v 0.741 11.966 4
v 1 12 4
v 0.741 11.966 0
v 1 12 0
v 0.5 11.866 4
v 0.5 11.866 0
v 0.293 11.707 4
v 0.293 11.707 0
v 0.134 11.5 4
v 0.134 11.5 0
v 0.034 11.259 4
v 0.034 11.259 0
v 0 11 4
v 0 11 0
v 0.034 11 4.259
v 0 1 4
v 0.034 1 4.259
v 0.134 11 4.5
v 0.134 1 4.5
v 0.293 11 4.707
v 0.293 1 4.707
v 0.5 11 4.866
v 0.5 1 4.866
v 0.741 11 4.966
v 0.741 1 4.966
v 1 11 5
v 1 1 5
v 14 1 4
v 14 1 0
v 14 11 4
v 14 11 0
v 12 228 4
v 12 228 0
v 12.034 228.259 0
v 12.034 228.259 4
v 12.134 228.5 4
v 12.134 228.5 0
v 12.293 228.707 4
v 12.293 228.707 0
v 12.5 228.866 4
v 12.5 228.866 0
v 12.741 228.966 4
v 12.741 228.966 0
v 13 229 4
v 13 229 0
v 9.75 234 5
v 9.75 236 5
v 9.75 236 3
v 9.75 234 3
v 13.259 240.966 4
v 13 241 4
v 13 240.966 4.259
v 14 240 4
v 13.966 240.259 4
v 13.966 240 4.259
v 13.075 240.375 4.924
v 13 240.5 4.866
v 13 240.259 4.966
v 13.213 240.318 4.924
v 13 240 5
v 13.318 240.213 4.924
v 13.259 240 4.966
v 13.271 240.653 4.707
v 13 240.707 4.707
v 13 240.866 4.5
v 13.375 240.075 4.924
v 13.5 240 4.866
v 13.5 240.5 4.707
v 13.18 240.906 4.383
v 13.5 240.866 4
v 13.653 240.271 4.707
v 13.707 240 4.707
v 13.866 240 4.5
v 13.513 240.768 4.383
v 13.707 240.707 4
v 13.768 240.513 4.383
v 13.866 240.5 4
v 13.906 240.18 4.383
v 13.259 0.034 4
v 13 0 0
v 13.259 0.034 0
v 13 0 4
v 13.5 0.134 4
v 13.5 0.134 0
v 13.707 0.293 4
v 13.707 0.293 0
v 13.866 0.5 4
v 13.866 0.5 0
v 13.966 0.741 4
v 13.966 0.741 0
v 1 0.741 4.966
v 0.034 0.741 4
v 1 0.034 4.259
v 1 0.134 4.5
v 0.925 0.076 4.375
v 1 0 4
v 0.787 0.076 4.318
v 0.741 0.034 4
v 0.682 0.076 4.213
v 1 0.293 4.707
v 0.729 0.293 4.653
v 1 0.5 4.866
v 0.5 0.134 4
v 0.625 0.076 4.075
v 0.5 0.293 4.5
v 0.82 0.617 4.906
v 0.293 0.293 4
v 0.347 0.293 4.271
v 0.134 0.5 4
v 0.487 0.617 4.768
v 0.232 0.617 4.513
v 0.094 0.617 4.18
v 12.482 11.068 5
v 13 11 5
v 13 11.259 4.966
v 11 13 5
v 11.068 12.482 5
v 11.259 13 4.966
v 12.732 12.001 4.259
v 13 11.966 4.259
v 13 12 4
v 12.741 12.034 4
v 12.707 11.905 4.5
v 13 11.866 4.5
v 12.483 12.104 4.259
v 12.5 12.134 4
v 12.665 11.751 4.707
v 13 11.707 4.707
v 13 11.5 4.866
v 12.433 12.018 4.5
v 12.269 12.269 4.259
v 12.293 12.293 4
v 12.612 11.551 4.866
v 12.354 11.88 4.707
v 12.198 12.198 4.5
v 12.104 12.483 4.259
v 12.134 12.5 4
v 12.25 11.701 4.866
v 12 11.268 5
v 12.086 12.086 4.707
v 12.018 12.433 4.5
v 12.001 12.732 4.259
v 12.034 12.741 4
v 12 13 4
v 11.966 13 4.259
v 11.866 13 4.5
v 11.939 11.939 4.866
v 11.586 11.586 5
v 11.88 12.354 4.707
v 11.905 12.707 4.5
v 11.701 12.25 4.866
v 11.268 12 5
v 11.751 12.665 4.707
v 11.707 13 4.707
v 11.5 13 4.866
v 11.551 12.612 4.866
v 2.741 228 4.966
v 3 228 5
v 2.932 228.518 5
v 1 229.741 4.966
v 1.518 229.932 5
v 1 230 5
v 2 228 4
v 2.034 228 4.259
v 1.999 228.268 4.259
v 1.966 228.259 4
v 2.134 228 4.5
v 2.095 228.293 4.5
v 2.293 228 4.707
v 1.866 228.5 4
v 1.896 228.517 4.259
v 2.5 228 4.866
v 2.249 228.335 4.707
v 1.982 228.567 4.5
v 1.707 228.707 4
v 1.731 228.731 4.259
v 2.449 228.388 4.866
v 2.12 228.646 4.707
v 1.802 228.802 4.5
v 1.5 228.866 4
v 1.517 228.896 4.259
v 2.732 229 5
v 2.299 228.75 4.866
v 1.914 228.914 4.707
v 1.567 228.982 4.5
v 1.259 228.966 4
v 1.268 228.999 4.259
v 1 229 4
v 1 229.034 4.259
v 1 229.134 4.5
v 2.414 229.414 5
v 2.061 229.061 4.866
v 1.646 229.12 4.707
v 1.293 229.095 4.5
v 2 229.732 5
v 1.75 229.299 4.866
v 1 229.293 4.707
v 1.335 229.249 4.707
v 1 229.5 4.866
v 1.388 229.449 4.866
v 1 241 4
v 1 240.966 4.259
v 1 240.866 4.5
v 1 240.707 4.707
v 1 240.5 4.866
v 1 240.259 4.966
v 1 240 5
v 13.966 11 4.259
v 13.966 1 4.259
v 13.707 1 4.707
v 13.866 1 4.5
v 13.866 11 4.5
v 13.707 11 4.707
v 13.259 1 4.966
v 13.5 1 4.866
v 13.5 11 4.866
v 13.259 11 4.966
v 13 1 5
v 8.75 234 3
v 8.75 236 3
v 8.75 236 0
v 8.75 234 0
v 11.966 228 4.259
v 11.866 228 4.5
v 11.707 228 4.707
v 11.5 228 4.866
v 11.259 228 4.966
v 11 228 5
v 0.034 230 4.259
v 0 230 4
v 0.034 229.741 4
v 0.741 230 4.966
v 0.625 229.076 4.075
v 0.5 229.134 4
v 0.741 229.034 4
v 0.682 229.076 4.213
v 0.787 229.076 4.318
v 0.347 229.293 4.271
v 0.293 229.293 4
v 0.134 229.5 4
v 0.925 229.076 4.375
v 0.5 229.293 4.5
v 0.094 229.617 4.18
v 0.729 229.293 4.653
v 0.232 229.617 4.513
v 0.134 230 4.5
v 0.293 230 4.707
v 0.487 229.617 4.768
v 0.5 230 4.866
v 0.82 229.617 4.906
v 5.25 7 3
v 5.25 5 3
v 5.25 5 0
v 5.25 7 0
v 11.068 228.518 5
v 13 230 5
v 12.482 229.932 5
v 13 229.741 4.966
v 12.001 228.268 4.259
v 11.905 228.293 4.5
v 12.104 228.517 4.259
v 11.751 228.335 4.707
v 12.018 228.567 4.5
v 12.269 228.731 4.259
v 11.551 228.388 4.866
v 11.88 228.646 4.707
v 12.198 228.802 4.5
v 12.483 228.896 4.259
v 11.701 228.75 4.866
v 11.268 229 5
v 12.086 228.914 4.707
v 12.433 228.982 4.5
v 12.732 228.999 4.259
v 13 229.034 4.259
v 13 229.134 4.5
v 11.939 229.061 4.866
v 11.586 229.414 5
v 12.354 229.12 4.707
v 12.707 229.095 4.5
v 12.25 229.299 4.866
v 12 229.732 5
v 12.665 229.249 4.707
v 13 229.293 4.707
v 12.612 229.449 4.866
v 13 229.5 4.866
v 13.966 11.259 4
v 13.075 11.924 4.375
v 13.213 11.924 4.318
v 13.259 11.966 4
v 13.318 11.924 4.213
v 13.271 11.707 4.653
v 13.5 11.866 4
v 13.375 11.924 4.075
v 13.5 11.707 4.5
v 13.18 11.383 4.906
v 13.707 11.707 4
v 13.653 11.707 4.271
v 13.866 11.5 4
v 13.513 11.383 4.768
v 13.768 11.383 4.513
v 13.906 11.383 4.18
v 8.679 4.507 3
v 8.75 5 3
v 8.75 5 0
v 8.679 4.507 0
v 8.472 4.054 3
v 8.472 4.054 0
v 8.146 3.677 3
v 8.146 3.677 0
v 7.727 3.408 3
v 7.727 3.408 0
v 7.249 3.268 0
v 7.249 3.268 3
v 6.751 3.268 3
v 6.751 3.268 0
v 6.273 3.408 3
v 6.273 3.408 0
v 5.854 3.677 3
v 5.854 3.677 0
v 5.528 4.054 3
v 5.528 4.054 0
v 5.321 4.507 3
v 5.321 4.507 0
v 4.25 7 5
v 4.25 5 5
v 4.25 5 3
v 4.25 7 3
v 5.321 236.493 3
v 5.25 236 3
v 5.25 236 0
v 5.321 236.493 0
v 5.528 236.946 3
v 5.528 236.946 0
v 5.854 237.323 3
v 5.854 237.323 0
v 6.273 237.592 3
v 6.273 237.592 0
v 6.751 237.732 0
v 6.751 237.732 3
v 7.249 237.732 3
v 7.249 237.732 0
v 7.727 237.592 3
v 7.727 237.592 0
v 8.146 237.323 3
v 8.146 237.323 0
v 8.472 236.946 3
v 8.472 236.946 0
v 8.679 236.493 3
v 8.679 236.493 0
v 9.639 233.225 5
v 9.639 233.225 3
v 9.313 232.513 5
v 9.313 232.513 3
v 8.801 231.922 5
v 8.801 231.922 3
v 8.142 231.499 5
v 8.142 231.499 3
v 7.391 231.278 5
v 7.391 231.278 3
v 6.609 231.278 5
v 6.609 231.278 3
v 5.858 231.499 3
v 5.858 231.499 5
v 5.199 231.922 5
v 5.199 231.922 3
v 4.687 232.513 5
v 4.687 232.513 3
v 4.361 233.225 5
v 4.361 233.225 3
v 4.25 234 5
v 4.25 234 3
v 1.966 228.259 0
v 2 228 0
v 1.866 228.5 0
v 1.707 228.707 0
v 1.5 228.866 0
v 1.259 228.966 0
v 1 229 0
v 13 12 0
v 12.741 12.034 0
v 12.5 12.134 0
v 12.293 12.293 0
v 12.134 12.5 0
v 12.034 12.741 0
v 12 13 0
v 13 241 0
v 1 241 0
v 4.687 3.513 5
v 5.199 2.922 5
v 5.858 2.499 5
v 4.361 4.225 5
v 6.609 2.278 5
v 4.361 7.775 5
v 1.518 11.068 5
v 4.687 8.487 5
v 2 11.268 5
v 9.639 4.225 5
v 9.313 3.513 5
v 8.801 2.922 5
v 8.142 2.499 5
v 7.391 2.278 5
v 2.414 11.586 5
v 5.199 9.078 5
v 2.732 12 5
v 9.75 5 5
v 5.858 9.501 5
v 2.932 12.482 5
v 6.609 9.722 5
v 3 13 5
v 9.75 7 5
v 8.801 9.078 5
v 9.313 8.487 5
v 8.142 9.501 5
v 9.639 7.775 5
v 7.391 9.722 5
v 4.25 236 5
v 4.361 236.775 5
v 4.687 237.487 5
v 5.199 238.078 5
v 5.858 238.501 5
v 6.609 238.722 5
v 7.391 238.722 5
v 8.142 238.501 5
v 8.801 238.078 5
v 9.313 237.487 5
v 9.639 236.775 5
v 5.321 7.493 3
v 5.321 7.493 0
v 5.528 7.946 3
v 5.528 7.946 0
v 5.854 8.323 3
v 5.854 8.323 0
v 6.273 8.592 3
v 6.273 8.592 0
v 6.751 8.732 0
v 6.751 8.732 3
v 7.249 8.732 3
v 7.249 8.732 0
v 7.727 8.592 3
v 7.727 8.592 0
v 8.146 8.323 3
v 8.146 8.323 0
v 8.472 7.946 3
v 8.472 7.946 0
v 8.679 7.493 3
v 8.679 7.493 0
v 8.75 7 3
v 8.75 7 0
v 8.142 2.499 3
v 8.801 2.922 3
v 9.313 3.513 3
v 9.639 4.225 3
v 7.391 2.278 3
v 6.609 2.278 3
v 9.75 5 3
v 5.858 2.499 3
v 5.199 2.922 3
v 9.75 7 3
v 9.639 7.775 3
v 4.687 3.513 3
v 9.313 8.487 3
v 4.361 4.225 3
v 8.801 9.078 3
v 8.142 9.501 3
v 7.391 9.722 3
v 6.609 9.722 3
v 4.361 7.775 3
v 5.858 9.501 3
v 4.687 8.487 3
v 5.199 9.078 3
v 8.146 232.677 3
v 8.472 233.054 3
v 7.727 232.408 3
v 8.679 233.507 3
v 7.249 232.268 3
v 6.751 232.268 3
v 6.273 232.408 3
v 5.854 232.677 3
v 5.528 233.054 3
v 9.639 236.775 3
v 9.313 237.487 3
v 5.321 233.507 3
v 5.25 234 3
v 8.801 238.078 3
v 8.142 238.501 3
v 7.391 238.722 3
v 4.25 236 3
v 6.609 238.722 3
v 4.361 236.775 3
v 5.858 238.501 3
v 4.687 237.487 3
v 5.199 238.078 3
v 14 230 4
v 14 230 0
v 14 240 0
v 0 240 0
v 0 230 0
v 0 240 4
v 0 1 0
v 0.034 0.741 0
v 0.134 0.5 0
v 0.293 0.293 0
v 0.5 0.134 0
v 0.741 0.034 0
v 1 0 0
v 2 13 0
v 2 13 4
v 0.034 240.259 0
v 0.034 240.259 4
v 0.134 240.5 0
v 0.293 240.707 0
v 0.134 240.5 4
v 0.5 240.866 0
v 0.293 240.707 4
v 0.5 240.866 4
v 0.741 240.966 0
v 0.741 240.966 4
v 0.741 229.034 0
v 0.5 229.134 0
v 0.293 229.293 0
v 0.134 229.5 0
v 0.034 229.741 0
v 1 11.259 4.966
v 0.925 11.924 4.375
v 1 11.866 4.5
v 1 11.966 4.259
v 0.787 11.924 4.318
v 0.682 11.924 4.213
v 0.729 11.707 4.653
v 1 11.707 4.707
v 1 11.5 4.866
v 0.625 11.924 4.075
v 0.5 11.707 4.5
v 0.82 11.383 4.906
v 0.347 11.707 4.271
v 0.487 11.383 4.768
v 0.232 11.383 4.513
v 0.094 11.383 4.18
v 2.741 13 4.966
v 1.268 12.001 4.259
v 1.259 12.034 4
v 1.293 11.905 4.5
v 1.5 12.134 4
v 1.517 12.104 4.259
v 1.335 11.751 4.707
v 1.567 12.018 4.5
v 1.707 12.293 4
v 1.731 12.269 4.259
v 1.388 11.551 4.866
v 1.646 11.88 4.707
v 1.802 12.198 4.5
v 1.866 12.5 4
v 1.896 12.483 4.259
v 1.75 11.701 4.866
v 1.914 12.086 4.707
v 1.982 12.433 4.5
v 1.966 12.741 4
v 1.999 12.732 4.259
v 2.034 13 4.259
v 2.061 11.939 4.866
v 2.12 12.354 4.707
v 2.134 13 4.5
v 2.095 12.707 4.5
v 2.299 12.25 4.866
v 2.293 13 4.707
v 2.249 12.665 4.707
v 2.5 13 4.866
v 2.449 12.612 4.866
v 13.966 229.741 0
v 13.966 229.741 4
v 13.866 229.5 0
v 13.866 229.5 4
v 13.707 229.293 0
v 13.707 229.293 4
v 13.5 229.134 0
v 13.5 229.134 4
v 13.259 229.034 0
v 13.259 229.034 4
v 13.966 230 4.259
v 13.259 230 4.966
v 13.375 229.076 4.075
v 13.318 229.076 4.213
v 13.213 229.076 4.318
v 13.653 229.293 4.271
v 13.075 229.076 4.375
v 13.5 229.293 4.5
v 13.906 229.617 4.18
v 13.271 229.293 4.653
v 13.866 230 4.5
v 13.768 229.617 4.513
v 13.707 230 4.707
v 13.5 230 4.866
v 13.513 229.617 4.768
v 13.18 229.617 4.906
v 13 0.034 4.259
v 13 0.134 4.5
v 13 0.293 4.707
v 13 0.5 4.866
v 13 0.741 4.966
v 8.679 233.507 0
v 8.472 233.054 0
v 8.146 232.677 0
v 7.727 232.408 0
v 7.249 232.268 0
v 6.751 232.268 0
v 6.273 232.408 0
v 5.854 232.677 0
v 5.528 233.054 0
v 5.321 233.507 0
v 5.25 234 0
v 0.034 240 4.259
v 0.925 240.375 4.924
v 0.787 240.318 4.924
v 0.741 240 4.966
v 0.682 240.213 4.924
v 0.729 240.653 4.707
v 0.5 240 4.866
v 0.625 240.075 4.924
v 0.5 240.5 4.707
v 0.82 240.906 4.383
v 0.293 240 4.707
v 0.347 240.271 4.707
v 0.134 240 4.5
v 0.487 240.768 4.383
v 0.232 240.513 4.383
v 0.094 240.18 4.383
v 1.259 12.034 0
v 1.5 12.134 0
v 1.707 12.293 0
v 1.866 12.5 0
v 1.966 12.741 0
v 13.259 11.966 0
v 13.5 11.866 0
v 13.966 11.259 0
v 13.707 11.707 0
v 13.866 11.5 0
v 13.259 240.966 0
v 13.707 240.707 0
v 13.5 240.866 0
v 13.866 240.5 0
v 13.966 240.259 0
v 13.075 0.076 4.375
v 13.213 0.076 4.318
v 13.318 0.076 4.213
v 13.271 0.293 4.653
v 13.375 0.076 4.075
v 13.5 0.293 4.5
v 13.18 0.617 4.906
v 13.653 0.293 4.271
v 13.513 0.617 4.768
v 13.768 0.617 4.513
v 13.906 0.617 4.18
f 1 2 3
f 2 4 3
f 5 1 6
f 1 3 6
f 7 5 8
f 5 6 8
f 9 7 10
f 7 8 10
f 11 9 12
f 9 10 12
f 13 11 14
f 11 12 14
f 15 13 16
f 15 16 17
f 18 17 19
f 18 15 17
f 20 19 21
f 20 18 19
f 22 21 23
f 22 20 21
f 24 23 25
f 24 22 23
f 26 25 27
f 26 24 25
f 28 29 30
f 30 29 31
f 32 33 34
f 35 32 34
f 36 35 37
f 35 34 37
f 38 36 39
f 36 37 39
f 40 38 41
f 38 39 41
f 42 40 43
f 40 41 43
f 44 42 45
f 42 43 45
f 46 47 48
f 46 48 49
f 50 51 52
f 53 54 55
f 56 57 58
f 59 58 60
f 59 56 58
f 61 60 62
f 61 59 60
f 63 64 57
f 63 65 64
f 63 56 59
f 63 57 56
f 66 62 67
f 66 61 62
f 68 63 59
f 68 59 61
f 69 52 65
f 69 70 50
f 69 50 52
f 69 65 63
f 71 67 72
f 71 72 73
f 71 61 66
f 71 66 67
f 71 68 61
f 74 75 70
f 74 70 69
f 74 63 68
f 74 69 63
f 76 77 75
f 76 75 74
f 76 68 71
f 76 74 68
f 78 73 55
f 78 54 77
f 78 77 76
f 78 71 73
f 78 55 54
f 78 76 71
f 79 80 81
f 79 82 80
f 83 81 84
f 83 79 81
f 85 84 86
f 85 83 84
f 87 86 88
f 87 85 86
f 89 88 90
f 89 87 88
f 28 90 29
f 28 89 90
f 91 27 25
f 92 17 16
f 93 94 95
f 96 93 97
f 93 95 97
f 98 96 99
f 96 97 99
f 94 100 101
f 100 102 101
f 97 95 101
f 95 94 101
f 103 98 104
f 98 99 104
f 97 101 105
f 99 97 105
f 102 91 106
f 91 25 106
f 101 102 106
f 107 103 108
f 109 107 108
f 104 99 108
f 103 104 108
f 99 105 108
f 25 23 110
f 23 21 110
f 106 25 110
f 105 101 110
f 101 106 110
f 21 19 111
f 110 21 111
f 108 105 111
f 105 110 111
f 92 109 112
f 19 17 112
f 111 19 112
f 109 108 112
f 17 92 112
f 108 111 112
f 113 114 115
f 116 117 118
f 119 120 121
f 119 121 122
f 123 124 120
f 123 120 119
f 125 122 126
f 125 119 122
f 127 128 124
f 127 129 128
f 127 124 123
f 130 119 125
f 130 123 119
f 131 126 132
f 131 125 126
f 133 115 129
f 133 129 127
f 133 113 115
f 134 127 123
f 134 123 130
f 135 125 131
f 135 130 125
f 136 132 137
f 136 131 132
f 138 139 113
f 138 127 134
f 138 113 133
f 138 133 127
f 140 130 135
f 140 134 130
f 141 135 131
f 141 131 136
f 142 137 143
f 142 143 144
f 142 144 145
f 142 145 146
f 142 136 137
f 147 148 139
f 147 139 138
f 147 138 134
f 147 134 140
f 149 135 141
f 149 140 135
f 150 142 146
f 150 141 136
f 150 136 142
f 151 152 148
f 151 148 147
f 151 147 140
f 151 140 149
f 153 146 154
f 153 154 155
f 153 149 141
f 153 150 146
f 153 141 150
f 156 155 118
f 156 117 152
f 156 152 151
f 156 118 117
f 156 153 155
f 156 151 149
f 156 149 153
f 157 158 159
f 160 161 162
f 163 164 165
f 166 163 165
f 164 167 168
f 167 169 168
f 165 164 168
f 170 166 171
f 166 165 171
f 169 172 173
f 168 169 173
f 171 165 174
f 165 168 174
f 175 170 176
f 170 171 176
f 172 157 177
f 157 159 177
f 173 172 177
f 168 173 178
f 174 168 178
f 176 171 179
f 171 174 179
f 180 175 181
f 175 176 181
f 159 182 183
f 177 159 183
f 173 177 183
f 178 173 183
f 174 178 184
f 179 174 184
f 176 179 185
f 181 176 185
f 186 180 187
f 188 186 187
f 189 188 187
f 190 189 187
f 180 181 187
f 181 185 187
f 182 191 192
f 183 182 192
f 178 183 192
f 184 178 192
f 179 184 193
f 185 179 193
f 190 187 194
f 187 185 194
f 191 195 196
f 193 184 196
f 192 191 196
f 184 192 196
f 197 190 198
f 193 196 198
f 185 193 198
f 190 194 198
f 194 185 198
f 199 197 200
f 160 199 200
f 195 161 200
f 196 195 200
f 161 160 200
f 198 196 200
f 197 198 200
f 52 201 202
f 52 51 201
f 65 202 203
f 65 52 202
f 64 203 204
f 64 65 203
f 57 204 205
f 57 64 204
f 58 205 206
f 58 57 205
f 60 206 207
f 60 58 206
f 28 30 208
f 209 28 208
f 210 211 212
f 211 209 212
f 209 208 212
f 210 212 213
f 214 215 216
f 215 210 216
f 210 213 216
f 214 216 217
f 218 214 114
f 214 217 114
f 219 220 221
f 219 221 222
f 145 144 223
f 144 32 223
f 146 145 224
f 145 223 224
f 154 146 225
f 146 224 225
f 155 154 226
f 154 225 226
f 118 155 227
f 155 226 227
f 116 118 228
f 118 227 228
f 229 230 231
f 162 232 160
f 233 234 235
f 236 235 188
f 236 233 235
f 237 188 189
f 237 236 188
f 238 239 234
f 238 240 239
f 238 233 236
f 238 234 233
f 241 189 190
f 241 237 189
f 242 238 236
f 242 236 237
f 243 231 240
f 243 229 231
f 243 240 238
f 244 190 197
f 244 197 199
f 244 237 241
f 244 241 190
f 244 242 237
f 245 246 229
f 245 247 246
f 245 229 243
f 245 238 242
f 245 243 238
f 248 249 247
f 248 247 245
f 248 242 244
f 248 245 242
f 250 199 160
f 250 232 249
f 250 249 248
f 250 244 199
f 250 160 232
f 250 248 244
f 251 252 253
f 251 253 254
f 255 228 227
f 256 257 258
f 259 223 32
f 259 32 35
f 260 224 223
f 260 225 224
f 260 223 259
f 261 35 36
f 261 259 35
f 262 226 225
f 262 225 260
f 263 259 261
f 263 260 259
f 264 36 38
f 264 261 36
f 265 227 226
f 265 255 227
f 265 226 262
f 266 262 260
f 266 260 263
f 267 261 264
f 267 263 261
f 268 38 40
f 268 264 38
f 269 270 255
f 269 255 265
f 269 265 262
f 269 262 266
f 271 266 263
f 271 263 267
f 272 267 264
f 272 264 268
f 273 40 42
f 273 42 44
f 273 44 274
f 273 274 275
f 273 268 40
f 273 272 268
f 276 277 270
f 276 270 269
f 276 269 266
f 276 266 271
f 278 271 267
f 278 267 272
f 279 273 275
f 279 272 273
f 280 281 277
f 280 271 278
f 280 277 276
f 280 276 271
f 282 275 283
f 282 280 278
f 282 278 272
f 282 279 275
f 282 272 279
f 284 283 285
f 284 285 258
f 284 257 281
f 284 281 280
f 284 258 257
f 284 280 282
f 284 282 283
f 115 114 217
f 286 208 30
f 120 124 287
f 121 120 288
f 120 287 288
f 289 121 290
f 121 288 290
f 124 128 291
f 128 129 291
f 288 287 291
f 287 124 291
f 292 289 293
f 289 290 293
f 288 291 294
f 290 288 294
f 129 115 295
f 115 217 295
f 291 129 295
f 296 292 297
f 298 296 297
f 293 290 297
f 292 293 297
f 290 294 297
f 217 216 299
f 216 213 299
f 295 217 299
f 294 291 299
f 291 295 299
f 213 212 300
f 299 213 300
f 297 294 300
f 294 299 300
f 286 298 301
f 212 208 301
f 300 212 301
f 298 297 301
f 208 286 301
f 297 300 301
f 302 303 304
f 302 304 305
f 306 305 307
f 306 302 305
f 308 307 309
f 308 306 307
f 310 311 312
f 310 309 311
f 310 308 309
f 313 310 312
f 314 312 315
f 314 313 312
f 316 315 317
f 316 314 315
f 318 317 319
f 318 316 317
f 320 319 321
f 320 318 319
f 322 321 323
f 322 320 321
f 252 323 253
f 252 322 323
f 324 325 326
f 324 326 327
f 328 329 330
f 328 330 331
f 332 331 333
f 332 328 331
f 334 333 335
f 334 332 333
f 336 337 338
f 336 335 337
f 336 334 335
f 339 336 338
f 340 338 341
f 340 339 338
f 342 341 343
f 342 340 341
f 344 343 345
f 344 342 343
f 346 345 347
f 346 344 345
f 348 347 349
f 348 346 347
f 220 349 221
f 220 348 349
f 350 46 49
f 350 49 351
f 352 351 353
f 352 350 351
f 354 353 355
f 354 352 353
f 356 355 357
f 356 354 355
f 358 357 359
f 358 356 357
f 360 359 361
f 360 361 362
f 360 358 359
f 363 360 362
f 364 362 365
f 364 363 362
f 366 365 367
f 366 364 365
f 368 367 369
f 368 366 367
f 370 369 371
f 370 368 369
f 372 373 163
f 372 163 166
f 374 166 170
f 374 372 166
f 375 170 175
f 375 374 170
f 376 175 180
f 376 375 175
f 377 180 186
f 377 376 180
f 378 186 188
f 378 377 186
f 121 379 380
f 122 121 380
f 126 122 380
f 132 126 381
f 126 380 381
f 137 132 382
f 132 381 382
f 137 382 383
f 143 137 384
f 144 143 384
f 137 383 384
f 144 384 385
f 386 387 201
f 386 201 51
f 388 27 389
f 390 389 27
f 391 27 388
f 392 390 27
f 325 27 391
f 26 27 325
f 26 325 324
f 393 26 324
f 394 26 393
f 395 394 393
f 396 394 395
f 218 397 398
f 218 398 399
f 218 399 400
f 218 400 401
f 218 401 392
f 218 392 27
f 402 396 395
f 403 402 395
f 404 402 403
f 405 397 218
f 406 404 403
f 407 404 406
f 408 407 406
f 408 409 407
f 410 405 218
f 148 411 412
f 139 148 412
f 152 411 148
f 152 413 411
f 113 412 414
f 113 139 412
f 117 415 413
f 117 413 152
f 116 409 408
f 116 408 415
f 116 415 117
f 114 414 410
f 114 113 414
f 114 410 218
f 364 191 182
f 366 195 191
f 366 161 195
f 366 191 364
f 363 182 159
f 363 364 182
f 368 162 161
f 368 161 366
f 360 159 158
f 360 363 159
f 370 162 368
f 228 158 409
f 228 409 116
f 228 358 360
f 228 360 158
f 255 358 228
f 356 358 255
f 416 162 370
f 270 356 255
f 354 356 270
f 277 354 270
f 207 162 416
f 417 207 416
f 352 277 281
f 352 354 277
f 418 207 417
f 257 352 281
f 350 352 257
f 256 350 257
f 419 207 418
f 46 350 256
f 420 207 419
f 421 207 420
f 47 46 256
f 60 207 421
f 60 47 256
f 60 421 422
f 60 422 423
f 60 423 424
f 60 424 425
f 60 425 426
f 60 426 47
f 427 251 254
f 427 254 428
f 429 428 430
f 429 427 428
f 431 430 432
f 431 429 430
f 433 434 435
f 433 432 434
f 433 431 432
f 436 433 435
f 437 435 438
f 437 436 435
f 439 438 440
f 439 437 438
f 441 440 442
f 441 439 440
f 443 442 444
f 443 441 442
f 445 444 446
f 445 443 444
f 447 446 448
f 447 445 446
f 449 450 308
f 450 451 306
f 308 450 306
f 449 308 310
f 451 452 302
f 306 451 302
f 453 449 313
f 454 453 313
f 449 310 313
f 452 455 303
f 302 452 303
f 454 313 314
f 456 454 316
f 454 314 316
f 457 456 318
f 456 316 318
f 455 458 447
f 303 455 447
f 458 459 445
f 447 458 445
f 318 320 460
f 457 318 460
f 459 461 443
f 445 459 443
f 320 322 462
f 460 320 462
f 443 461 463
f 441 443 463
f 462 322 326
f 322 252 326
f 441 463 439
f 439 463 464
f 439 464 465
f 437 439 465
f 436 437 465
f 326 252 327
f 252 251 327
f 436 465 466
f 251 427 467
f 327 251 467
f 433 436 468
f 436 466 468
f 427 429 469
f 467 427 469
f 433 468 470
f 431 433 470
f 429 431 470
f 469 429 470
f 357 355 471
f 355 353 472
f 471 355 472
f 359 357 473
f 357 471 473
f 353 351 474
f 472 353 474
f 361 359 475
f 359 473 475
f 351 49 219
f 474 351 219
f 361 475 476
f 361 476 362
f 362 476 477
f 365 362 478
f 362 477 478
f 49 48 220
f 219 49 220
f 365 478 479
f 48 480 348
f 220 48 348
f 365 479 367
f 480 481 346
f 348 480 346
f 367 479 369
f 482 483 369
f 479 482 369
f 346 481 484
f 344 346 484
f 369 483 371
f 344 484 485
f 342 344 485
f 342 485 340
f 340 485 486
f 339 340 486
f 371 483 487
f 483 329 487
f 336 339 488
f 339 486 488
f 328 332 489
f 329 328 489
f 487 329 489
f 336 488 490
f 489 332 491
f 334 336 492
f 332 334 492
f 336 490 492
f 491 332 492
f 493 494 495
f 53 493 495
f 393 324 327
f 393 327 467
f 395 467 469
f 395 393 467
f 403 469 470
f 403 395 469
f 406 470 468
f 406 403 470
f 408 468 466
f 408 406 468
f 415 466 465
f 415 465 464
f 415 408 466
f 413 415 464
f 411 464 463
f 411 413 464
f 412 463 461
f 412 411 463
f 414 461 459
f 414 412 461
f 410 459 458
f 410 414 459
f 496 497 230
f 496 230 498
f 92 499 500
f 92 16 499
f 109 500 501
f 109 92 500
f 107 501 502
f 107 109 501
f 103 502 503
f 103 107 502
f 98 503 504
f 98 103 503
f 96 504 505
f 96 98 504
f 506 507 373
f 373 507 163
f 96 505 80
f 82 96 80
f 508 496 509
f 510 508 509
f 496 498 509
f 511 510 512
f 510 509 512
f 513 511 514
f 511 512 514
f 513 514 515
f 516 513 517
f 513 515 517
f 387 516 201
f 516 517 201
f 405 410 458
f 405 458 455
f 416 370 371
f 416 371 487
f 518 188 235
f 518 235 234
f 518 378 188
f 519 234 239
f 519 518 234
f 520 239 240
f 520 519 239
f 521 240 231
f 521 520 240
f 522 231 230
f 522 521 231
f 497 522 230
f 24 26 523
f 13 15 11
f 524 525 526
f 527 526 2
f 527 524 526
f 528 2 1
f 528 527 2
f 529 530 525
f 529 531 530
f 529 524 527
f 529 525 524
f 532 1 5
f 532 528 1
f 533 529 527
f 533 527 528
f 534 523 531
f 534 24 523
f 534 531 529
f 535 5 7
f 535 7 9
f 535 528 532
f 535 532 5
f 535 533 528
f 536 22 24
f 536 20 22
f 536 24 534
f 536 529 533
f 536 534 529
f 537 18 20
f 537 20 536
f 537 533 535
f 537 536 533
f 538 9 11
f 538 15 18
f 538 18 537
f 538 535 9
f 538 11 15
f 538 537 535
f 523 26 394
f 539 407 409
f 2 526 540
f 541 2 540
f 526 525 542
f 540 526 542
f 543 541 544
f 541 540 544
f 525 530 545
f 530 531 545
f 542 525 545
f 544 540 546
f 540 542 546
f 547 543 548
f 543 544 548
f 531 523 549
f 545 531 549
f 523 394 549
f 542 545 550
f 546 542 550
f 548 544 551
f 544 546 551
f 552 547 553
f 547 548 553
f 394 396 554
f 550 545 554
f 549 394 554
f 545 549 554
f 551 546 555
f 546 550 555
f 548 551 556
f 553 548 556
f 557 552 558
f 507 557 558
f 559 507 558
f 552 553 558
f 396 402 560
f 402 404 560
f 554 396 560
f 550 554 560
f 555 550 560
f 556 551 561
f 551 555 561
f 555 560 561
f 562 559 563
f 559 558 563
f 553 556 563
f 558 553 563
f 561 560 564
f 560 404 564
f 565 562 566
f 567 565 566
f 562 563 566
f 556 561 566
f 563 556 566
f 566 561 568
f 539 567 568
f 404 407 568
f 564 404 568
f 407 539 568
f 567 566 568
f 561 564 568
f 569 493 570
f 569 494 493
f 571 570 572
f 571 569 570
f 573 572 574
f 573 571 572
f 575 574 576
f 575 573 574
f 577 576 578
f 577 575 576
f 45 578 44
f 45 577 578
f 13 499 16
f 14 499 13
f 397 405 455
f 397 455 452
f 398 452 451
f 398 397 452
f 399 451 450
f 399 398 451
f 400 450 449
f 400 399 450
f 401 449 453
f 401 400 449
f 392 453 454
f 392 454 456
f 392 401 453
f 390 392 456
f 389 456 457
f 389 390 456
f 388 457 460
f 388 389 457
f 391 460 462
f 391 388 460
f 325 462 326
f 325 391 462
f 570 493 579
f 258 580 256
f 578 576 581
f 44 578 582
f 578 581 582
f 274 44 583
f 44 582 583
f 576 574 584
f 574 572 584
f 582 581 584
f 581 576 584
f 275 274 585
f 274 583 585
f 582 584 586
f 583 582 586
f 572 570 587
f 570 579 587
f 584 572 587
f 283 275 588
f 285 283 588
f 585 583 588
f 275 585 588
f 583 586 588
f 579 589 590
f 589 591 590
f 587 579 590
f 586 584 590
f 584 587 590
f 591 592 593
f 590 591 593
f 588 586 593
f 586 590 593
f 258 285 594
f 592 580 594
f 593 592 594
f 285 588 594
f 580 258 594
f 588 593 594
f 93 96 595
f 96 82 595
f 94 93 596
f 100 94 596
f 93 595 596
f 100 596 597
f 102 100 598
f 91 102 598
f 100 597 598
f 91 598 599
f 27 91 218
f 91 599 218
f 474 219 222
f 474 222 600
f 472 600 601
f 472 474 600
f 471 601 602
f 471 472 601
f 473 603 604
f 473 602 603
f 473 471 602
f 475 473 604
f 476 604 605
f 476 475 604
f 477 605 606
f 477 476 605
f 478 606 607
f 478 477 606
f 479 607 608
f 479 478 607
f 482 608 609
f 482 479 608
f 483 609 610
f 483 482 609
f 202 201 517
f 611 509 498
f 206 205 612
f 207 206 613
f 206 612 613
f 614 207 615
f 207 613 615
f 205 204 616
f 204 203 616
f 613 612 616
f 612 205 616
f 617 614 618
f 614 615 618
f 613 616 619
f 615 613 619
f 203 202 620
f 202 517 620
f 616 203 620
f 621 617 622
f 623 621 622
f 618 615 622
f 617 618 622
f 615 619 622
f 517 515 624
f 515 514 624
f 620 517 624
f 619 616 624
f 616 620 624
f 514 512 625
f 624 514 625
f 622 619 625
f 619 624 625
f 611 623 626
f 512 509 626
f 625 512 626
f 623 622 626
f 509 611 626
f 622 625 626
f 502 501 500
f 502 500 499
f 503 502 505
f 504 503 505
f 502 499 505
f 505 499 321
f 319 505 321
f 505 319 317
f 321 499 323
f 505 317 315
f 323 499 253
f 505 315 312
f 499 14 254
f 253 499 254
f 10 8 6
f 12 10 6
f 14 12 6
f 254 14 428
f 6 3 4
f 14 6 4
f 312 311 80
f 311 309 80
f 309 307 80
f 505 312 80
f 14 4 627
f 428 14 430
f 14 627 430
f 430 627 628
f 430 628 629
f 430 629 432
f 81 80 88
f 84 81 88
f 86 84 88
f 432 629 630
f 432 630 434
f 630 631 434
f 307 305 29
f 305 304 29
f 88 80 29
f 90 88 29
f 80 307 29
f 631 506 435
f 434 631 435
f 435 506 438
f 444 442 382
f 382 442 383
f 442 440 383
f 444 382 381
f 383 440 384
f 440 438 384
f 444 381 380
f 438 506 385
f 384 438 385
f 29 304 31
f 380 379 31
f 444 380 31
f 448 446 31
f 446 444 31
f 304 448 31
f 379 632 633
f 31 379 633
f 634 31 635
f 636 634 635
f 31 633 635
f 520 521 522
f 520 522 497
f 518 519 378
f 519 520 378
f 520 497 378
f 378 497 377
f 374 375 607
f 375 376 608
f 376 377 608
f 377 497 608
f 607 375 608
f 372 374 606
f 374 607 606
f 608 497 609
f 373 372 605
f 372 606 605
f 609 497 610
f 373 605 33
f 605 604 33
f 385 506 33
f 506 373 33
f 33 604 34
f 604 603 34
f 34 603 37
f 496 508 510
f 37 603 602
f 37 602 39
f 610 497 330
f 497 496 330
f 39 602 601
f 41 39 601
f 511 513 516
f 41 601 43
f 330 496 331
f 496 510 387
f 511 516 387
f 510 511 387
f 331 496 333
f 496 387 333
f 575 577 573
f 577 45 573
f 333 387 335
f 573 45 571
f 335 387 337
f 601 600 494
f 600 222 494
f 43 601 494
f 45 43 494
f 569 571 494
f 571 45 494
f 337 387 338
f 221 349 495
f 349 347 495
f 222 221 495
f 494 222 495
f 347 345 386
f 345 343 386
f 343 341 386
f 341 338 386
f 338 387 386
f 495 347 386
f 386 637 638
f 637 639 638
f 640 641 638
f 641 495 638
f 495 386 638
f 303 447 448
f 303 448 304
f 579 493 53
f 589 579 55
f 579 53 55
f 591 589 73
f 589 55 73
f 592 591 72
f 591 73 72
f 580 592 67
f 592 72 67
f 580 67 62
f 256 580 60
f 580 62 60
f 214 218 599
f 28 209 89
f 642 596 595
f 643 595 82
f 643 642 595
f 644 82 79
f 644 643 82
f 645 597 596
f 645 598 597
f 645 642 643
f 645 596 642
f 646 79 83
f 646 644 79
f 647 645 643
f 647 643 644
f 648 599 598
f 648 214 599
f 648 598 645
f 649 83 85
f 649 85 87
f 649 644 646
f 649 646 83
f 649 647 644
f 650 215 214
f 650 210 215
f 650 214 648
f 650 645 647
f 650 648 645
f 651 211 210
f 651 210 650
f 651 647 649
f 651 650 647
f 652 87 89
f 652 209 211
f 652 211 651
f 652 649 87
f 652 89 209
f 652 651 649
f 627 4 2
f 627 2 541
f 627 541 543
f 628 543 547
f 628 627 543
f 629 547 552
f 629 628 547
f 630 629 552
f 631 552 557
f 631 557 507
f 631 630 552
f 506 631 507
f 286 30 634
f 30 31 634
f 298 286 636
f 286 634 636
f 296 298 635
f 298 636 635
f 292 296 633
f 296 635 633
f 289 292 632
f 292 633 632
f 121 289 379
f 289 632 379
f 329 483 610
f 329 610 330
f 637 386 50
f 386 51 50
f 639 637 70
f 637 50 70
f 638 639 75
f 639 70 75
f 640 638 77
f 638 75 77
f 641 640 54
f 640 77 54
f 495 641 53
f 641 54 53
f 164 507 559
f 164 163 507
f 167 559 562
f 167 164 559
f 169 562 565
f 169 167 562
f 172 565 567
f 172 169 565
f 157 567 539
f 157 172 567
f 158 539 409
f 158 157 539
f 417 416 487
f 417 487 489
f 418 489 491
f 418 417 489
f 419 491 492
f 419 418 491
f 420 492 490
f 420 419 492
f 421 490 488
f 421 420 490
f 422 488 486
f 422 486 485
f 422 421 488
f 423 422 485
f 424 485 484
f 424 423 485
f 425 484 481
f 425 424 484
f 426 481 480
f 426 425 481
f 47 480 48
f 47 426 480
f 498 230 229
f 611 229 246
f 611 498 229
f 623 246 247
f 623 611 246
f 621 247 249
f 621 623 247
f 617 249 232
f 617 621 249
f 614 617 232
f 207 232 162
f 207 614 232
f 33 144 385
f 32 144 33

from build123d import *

# Parameters (mm, degrees)
SKETCH1_W           = 14
SKETCH1_H           = 241
BOSS_EXTRUDE1_DEPTH = 5
CUT_EXTRUDE3_REACH  = 243.458
SKETCH4_W           = 2
SKETCH4_H           = 217
CUT_EXTRUDE1_DEPTH  = 242.458070894
CUT_EXTRUDE2_DEPTH  = 2
FILLET1_R           = 1


with BuildPart() as part:
    # Sketch1 → Boss-Extrude1 (new body)
    with BuildSketch(Plane.XY):
        with Locations((7, 120.5)):
            Rectangle(SKETCH1_W, SKETCH1_H)
    extrude(amount=BOSS_EXTRUDE1_DEPTH)

    # Sketch4 → Cut-Extrude3 (cut, up to next)
    with BuildSketch(Plane.XY.offset(5), mode=Mode.PRIVATE) as cut_extrude3_sk1:
        with Locations((1, 120.5)):
            Rectangle(SKETCH4_W, SKETCH4_H)
    cut_extrude3_tool1 = extrude(cut_extrude3_sk1.sketch, amount=-CUT_EXTRUDE3_REACH, mode=Mode.PRIVATE) & part.part
    # Sketch4 → Cut-Extrude3 (cut, up to next)
    with BuildSketch(Plane.XY.offset(5), mode=Mode.PRIVATE) as cut_extrude3_sk2:
        with Locations((13, 120.5)):
            Rectangle(SKETCH4_W, SKETCH4_H)
    cut_extrude3_tool2 = extrude(cut_extrude3_sk2.sketch, amount=-CUT_EXTRUDE3_REACH, mode=Mode.PRIVATE) & part.part
    add(cut_extrude3_tool1.solids().sort_by_distance((1, 120.5, 5))[0], mode=Mode.SUBTRACT)
    add(cut_extrude3_tool2.solids().sort_by_distance((13, 120.5, 5))[0], mode=Mode.SUBTRACT)

    # Sketch2 → Cut-Extrude1 (cut, through all)
    with BuildSketch(Plane.XY.offset(5)):
        with BuildLine():
            Line((8.75, 7), (8.75, 5))
            ThreePointArc((8.75, 5), (7, 3.25), (5.25, 5))
            Line((5.25, 5), (5.25, 7))
            ThreePointArc((5.25, 7), (7, 8.75), (8.75, 7))
        make_face()
        with BuildLine():
            Line((8.75, 236), (8.75, 234))
            ThreePointArc((8.75, 234), (7, 232.25), (5.25, 234))
            Line((5.25, 234), (5.25, 236))
            ThreePointArc((5.25, 236), (7, 237.75), (8.75, 236))
        make_face()
    extrude(amount=-CUT_EXTRUDE1_DEPTH, mode=Mode.SUBTRACT)

    # Sketch3 → Cut-Extrude2 (cut)
    with BuildSketch(Plane.XY.offset(5)):
        with BuildLine():
            Line((9.75, 7), (9.75, 5))
            ThreePointArc((9.75, 5), (7, 2.25), (4.25, 5))
            Line((4.25, 5), (4.25, 7))
            ThreePointArc((4.25, 7), (7, 9.75), (9.75, 7))
        make_face()
        with BuildLine():
            Line((9.75, 236), (9.75, 234))
            ThreePointArc((9.75, 234), (7, 231.25), (4.25, 234))
            Line((4.25, 234), (4.25, 236))
            ThreePointArc((4.25, 236), (7, 238.75), (9.75, 236))
        make_face()
    extrude(amount=-CUT_EXTRUDE2_DEPTH, mode=Mode.SUBTRACT)

    # Fillet1
    fillet1_edges = [part.edges().sort_by_distance(p)[0] for p in [
        (2, 229, 2.5),
        (12, 229, 2.5),
        (12, 12, 2.5),
        (2, 12, 2.5),
    ]]
    fillet(fillet1_edges, radius=FILLET1_R)
    fillet1_2_edges = [part.edges().sort_by_distance(p)[0] for p in [
        (0, 241, 2.5),
        (14, 241, 2.5),
        (7, 241, 5),
        (14, 6, 5),
        (14, 235, 5),
        (0, 6, 5),
        (0, 235, 5),
        (7, 0, 5),
        (0, 0, 2.5),
        (14, 0, 2.5),
        (0, 229, 2.5),
        (14, 229, 2.5),
        (12, 120.5, 5),
        (14, 12, 2.5),
        (2, 120.5, 5),
        (0, 12, 2.5),
        (1.707106781, 228.707106781, 5),
        (1.707106781, 12.292893219, 5),
        (12.292893219, 228.707106781, 5),
        (12.292893219, 12.292893219, 5),
    ]]
    fillet(fillet1_2_edges, radius=FILLET1_R - 0.0001)  # a hair under: the kernel refuses the full size


solid = part.part
